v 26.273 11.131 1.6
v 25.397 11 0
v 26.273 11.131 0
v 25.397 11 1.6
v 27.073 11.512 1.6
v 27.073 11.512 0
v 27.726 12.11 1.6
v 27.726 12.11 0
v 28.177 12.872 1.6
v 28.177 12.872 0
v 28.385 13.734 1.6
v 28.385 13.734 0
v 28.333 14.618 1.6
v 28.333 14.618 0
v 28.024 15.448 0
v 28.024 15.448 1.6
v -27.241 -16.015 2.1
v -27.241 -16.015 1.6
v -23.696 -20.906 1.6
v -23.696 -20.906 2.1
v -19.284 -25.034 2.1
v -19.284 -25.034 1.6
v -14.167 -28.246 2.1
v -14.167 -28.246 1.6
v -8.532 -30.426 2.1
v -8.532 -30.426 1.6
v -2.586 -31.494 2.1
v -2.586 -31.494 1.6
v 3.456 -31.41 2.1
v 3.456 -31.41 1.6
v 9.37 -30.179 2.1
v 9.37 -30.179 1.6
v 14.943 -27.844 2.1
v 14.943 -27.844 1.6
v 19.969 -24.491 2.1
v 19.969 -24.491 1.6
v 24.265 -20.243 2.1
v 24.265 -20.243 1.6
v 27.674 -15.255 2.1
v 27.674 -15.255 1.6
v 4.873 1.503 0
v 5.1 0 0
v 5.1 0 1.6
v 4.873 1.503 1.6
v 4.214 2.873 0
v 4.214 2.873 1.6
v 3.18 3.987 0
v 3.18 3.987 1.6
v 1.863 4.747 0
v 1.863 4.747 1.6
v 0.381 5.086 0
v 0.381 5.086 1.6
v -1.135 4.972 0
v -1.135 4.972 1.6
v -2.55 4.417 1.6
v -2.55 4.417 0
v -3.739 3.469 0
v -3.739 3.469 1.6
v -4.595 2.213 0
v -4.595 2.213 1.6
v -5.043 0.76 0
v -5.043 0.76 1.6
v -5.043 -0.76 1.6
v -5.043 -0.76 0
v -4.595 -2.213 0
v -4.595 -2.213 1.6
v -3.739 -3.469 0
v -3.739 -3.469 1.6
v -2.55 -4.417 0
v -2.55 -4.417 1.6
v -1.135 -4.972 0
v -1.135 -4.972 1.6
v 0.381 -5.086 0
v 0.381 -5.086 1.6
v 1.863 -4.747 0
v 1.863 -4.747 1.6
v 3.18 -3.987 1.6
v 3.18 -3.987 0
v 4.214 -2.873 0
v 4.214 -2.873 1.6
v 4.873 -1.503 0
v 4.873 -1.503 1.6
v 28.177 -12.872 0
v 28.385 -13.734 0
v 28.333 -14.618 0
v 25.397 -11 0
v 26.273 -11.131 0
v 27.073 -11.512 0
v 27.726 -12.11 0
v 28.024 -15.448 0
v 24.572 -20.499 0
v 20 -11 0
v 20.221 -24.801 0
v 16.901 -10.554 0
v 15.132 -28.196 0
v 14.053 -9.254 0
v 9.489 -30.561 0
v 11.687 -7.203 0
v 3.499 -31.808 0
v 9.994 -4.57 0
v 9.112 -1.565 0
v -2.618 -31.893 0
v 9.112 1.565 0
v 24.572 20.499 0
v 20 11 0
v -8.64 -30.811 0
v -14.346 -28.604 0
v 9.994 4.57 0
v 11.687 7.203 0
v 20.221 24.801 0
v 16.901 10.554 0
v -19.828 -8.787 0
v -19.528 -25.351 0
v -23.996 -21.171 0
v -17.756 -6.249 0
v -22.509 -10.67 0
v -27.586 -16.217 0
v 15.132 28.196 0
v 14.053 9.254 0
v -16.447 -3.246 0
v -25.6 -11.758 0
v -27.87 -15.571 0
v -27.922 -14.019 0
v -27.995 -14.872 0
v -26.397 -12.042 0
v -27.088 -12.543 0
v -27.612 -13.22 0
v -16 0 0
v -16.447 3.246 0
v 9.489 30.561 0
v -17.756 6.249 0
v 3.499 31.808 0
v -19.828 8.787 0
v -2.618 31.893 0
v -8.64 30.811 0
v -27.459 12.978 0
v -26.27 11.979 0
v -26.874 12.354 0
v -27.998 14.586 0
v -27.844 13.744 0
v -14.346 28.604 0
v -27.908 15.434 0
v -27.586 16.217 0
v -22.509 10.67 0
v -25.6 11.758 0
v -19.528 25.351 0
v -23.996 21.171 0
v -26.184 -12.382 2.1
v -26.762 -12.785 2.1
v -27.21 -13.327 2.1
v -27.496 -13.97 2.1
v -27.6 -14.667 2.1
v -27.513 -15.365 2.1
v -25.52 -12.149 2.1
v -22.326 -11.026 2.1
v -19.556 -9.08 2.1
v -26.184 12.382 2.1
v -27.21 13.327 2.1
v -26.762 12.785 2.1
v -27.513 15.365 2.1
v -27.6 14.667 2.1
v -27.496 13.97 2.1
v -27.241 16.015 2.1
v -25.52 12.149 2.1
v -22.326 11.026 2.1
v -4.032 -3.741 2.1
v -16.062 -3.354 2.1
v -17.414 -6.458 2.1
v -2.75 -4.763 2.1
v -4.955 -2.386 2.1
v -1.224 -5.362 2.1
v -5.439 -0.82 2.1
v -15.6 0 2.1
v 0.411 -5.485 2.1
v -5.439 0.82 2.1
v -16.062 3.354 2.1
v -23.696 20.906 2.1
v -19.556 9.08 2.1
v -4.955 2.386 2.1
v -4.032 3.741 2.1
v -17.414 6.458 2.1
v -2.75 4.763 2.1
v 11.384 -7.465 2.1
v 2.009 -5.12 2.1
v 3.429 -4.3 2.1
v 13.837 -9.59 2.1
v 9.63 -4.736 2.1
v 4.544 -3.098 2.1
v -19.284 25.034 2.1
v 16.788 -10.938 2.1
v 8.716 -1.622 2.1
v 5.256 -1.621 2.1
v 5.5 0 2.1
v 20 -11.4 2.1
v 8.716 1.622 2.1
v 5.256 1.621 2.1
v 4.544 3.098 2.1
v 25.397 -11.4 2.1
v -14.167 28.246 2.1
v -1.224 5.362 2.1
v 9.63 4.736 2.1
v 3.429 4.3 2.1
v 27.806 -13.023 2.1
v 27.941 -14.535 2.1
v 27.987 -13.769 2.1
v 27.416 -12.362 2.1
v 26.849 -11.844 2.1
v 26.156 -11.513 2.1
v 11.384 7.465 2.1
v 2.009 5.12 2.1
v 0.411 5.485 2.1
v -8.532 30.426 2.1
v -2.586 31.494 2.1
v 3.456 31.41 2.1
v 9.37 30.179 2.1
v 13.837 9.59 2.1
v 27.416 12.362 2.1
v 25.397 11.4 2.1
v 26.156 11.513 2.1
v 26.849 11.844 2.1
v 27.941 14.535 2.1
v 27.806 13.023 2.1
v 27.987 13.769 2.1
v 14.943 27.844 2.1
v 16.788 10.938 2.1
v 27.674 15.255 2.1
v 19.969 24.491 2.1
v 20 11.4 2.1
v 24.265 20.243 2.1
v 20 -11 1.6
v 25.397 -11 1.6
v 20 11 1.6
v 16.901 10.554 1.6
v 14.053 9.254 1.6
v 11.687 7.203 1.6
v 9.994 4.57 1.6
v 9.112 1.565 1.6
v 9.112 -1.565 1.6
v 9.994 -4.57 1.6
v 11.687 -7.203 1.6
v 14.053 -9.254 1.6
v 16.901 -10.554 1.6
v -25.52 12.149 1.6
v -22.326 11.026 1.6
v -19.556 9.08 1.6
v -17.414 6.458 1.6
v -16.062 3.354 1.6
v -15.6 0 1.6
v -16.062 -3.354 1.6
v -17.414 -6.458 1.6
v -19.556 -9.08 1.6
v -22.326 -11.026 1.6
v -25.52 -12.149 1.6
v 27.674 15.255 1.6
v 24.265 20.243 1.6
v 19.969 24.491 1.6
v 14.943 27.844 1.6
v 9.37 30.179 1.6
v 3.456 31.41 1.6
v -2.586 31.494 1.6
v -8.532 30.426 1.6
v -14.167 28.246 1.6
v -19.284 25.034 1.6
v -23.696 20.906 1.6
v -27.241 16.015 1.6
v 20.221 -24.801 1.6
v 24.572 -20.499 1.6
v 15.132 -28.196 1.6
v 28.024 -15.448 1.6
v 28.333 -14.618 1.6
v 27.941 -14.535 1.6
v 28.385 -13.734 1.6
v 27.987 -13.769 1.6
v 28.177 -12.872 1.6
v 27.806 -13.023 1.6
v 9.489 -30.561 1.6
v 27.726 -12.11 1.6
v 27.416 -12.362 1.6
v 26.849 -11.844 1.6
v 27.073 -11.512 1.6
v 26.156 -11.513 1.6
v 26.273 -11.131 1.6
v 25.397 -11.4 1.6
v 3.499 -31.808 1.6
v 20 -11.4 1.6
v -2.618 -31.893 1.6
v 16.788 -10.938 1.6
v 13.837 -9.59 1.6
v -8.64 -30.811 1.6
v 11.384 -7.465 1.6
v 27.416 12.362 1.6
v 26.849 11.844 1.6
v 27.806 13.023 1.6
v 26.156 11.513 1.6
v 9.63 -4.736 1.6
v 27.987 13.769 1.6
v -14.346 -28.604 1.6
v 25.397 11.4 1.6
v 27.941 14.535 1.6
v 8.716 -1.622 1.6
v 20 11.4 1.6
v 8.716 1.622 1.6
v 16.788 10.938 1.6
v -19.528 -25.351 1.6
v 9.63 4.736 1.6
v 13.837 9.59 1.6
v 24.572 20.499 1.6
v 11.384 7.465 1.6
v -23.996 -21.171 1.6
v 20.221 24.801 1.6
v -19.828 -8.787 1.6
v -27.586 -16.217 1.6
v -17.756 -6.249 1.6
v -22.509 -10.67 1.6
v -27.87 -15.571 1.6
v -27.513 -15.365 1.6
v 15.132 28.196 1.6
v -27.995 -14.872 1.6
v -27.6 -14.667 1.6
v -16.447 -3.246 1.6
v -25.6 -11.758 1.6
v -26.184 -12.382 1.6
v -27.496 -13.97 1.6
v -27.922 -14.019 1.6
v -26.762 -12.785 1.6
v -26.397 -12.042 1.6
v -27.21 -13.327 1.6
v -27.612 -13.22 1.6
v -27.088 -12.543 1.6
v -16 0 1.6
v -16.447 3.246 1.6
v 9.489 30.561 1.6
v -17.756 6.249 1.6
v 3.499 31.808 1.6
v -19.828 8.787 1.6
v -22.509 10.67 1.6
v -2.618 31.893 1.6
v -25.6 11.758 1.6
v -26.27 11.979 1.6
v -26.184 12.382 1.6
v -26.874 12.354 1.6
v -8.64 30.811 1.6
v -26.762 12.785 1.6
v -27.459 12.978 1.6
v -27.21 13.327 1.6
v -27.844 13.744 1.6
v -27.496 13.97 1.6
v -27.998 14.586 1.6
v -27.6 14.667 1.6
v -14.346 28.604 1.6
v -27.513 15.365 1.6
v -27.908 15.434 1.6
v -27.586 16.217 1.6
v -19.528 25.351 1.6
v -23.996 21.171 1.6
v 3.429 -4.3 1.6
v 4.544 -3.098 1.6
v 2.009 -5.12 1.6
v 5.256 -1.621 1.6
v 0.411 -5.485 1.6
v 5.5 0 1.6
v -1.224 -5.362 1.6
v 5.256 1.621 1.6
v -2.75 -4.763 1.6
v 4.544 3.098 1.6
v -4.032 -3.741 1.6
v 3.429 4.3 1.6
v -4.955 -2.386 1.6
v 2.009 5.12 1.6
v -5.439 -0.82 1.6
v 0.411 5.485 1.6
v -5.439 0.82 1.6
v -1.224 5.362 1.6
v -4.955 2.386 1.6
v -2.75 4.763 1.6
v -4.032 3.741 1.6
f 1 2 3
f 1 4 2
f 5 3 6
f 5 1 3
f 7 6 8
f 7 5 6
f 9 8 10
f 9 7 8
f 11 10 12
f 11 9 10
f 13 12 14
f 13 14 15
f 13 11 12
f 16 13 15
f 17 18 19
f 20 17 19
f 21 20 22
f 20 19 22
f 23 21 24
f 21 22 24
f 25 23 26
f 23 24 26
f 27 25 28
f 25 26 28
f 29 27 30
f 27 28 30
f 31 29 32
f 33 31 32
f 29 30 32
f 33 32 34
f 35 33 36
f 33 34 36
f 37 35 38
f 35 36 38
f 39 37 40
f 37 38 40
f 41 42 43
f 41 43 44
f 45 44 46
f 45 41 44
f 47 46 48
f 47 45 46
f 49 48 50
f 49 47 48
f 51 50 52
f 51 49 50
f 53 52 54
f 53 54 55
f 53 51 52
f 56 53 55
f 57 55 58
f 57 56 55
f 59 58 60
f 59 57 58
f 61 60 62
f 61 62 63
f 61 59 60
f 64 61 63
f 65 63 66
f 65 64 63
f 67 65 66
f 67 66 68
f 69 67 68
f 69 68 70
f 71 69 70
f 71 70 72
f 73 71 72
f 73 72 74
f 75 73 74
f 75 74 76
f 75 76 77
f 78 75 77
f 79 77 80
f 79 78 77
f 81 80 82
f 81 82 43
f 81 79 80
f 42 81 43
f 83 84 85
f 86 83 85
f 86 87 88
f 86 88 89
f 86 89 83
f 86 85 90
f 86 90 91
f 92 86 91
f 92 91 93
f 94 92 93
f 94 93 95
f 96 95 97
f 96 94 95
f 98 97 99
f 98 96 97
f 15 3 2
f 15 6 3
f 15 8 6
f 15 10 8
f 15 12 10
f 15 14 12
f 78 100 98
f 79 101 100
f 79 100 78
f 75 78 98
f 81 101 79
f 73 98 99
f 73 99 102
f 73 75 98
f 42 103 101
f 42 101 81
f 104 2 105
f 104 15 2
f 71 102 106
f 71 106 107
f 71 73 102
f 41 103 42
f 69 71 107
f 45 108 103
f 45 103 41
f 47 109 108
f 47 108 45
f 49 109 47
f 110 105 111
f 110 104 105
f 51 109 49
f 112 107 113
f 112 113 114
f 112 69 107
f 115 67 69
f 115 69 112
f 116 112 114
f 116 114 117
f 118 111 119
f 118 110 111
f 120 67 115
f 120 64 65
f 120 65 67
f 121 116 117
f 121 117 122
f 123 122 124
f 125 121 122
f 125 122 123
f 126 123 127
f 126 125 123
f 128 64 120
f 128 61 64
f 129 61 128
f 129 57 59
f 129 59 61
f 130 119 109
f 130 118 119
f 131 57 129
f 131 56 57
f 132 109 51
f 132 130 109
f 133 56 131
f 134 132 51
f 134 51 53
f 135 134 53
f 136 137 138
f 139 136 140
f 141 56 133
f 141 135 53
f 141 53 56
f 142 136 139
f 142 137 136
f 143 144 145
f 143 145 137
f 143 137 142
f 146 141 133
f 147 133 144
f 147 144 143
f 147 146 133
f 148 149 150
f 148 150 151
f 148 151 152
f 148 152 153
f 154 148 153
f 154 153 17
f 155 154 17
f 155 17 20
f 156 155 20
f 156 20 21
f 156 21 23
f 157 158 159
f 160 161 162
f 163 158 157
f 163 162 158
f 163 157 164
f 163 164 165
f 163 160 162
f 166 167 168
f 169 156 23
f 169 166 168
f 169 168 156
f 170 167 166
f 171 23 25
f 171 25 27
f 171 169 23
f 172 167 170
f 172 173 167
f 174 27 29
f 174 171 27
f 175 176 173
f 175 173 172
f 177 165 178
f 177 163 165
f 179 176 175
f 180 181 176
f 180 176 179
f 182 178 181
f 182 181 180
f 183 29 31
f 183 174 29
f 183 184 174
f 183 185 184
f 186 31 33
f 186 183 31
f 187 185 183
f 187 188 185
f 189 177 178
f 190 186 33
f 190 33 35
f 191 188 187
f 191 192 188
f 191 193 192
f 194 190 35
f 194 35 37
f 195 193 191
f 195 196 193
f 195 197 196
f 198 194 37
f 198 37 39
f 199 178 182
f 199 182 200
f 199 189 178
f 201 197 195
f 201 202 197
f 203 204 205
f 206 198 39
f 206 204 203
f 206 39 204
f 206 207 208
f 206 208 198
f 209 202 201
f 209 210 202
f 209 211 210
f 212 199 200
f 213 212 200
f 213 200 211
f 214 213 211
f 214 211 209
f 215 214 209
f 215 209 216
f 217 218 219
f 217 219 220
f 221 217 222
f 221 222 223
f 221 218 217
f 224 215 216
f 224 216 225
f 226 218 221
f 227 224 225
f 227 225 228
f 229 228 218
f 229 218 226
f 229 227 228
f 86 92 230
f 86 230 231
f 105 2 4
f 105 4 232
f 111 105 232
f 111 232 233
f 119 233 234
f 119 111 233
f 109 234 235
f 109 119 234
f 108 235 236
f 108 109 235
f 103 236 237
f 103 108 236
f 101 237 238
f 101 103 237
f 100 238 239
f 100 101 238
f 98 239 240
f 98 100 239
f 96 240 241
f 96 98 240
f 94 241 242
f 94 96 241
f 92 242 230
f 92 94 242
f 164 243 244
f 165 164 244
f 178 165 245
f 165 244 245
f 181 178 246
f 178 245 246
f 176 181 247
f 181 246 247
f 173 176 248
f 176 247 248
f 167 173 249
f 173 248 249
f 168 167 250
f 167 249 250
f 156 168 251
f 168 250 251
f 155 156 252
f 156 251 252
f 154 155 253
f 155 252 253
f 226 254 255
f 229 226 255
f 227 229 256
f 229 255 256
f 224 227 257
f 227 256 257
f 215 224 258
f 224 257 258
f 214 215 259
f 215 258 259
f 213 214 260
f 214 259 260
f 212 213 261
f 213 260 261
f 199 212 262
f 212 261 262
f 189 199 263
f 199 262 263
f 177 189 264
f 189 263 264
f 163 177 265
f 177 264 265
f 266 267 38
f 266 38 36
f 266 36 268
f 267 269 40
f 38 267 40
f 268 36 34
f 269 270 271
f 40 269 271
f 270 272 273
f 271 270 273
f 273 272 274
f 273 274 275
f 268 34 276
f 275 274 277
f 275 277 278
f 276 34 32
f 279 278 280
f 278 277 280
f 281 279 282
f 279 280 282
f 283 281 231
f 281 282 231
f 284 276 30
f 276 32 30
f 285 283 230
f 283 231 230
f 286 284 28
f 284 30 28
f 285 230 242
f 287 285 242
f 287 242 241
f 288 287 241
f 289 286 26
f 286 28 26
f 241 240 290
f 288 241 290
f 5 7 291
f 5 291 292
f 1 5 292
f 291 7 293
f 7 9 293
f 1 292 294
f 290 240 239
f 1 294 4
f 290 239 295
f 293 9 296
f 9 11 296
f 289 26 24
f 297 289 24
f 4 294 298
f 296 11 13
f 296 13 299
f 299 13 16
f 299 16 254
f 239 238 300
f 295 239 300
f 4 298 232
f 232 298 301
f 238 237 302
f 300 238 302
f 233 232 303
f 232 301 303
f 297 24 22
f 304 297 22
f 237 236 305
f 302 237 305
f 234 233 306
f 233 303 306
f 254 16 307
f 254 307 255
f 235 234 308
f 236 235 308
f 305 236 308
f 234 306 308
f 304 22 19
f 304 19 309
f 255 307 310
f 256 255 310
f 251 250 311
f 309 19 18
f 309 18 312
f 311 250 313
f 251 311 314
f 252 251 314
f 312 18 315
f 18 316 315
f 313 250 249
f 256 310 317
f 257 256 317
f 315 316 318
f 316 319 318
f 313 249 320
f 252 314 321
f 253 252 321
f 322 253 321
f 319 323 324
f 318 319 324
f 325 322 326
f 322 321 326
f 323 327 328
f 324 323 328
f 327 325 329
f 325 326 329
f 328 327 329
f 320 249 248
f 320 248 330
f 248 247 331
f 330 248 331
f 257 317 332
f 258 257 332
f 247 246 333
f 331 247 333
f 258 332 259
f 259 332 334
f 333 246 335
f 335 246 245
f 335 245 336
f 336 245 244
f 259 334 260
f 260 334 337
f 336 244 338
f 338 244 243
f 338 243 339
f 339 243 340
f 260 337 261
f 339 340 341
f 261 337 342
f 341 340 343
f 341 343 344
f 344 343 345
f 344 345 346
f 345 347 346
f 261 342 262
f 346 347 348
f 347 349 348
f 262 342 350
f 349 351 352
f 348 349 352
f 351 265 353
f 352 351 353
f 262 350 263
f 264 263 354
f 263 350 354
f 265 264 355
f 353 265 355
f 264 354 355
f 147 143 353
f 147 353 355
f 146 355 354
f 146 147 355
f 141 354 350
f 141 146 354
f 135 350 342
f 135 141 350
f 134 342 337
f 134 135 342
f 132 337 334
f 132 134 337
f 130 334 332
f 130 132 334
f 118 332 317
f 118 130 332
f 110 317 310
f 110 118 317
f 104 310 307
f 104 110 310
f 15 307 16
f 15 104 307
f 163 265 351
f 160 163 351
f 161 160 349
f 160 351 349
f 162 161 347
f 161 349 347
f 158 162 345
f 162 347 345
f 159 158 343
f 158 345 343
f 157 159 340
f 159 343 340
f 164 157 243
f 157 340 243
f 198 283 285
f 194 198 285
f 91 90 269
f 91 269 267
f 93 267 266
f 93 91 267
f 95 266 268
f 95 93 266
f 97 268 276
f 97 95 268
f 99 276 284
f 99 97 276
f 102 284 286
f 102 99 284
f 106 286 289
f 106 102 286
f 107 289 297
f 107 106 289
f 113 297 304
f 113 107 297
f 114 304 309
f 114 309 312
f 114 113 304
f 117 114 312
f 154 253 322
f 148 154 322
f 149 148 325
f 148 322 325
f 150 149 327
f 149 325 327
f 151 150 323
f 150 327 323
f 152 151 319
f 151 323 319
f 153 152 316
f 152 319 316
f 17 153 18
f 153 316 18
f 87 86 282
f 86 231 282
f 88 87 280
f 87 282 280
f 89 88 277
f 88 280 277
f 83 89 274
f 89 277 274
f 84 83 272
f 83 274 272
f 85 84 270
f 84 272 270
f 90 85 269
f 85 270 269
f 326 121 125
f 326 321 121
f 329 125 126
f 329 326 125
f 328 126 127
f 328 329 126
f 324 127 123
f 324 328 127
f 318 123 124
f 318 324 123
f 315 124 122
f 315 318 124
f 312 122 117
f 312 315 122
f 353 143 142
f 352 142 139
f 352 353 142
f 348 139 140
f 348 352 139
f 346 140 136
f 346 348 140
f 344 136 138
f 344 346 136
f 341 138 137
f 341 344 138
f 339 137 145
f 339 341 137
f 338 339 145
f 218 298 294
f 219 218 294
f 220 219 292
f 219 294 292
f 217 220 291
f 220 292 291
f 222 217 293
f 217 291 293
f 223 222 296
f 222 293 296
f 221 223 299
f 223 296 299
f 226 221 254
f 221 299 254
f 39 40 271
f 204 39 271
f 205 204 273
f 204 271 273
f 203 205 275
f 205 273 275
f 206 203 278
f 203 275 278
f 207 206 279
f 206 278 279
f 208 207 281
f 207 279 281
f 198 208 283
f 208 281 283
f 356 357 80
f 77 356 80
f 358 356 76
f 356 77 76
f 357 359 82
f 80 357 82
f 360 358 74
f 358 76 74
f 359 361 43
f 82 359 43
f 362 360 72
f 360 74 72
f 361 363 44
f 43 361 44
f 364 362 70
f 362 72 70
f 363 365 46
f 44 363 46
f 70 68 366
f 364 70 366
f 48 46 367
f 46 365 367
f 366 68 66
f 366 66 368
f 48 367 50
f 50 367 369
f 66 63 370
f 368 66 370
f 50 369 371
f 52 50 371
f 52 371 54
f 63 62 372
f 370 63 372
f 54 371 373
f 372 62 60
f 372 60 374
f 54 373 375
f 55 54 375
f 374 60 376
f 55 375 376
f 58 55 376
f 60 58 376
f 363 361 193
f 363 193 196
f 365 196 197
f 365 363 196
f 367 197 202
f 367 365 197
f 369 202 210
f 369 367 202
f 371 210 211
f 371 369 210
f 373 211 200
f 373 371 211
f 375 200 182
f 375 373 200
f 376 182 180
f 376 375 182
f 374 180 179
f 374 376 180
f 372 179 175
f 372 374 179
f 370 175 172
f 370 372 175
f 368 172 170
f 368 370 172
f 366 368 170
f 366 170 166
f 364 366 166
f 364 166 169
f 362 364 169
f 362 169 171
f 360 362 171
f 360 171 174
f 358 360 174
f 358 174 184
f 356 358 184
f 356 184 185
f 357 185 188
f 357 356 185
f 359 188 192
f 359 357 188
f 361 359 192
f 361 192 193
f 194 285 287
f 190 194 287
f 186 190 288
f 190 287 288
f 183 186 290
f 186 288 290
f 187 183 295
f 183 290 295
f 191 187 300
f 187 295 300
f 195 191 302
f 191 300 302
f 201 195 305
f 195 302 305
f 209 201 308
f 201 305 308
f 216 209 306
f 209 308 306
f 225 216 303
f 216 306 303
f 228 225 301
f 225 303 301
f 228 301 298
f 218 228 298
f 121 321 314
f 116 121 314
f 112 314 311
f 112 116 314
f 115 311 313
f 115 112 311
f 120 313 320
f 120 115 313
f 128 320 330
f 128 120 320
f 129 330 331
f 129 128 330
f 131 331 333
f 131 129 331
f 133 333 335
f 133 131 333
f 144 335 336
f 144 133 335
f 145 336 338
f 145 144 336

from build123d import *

# Parameters (mm, degrees)
ESQUISSE1_R        = 5.1
BOSS_EXTRU_1_DEPTH = 1.6
CONG_1_R           = 3
ESQUISSE2_R        = 5.5
BOSS_EXTRU_2_DEPTH = 0.5


with BuildPart() as part:
    # Esquisse1 → Boss.-Extru.1 (new body)
    with BuildSketch(Plane.XY):
        with BuildLine():
            Line((30.049958403, 11), (20, 11))
            ThreePointArc((20, 11), (9, 0), (20, -11))
            Line((20, -11), (30.049958403, -11))
            ThreePointArc((30.049958403, -11), (0.469484965, -31.996555813), (-29.714285714, -11.876919823))
            ThreePointArc((-29.714285714, -11.876919823), (-16, 0), (-29.714285714, 11.876919823))
            ThreePointArc((-29.714285714, 11.876919823), (0.469484965, 31.996555813), (30.049958403, 11))
        make_face()
        Circle(ESQUISSE1_R, mode=Mode.SUBTRACT)
    extrude(amount=BOSS_EXTRU_1_DEPTH)

    # Congé1
    cong_1_edges = [part.edges().sort_by_distance(p)[0] for p in [
        (30.049958403, 11, 0.8),
        (30.049958403, -11, 0.8),
        (-29.714285714, -11.876919823, 0.8),
        (-29.714285714, 11.876919823, 0.8),
    ]]
    fillet(cong_1_edges, radius=CONG_1_R)

    # Esquisse2 → Boss.-Extru.2 (add)
    with BuildSketch(Plane.XY.offset(1.6)):
        with BuildLine():
            Line((20, 11.4), (25.396850198, 11.4))
            ThreePointArc((25.396850198, 11.4), (27.635538238, 12.677776168), (27.673809182, 15.255172414))
            ThreePointArc((27.673809182, 15.255172414), (0.43695488, 31.596978818), (-27.24137931, 16.014595008))
            ThreePointArc((-27.24137931, 16.014595008), (-27.375100724, 13.639159391), (-25.52, 12.149469124))
            ThreePointArc((-25.52, 12.149469124), (-15.6, 0), (-25.52, -12.149469124))
            ThreePointArc((-25.52, -12.149469124), (-27.375100724, -13.639159391), (-27.24137931, -16.014595008))
            ThreePointArc((-27.24137931, -16.014595008), (0.43695488, -31.596978818), (27.673809182, -15.255172414))
            ThreePointArc((27.673809182, -15.255172414), (27.635538238, -12.677776168), (25.396850198, -11.4))
            Line((25.396850198, -11.4), (20, -11.4))
            ThreePointArc((20, -11.4), (8.6, 0), (20, 11.4))
        make_face()
        Circle(ESQUISSE2_R, mode=Mode.SUBTRACT)
    extrude(amount=BOSS_EXTRU_2_DEPTH)


solid = part.part
